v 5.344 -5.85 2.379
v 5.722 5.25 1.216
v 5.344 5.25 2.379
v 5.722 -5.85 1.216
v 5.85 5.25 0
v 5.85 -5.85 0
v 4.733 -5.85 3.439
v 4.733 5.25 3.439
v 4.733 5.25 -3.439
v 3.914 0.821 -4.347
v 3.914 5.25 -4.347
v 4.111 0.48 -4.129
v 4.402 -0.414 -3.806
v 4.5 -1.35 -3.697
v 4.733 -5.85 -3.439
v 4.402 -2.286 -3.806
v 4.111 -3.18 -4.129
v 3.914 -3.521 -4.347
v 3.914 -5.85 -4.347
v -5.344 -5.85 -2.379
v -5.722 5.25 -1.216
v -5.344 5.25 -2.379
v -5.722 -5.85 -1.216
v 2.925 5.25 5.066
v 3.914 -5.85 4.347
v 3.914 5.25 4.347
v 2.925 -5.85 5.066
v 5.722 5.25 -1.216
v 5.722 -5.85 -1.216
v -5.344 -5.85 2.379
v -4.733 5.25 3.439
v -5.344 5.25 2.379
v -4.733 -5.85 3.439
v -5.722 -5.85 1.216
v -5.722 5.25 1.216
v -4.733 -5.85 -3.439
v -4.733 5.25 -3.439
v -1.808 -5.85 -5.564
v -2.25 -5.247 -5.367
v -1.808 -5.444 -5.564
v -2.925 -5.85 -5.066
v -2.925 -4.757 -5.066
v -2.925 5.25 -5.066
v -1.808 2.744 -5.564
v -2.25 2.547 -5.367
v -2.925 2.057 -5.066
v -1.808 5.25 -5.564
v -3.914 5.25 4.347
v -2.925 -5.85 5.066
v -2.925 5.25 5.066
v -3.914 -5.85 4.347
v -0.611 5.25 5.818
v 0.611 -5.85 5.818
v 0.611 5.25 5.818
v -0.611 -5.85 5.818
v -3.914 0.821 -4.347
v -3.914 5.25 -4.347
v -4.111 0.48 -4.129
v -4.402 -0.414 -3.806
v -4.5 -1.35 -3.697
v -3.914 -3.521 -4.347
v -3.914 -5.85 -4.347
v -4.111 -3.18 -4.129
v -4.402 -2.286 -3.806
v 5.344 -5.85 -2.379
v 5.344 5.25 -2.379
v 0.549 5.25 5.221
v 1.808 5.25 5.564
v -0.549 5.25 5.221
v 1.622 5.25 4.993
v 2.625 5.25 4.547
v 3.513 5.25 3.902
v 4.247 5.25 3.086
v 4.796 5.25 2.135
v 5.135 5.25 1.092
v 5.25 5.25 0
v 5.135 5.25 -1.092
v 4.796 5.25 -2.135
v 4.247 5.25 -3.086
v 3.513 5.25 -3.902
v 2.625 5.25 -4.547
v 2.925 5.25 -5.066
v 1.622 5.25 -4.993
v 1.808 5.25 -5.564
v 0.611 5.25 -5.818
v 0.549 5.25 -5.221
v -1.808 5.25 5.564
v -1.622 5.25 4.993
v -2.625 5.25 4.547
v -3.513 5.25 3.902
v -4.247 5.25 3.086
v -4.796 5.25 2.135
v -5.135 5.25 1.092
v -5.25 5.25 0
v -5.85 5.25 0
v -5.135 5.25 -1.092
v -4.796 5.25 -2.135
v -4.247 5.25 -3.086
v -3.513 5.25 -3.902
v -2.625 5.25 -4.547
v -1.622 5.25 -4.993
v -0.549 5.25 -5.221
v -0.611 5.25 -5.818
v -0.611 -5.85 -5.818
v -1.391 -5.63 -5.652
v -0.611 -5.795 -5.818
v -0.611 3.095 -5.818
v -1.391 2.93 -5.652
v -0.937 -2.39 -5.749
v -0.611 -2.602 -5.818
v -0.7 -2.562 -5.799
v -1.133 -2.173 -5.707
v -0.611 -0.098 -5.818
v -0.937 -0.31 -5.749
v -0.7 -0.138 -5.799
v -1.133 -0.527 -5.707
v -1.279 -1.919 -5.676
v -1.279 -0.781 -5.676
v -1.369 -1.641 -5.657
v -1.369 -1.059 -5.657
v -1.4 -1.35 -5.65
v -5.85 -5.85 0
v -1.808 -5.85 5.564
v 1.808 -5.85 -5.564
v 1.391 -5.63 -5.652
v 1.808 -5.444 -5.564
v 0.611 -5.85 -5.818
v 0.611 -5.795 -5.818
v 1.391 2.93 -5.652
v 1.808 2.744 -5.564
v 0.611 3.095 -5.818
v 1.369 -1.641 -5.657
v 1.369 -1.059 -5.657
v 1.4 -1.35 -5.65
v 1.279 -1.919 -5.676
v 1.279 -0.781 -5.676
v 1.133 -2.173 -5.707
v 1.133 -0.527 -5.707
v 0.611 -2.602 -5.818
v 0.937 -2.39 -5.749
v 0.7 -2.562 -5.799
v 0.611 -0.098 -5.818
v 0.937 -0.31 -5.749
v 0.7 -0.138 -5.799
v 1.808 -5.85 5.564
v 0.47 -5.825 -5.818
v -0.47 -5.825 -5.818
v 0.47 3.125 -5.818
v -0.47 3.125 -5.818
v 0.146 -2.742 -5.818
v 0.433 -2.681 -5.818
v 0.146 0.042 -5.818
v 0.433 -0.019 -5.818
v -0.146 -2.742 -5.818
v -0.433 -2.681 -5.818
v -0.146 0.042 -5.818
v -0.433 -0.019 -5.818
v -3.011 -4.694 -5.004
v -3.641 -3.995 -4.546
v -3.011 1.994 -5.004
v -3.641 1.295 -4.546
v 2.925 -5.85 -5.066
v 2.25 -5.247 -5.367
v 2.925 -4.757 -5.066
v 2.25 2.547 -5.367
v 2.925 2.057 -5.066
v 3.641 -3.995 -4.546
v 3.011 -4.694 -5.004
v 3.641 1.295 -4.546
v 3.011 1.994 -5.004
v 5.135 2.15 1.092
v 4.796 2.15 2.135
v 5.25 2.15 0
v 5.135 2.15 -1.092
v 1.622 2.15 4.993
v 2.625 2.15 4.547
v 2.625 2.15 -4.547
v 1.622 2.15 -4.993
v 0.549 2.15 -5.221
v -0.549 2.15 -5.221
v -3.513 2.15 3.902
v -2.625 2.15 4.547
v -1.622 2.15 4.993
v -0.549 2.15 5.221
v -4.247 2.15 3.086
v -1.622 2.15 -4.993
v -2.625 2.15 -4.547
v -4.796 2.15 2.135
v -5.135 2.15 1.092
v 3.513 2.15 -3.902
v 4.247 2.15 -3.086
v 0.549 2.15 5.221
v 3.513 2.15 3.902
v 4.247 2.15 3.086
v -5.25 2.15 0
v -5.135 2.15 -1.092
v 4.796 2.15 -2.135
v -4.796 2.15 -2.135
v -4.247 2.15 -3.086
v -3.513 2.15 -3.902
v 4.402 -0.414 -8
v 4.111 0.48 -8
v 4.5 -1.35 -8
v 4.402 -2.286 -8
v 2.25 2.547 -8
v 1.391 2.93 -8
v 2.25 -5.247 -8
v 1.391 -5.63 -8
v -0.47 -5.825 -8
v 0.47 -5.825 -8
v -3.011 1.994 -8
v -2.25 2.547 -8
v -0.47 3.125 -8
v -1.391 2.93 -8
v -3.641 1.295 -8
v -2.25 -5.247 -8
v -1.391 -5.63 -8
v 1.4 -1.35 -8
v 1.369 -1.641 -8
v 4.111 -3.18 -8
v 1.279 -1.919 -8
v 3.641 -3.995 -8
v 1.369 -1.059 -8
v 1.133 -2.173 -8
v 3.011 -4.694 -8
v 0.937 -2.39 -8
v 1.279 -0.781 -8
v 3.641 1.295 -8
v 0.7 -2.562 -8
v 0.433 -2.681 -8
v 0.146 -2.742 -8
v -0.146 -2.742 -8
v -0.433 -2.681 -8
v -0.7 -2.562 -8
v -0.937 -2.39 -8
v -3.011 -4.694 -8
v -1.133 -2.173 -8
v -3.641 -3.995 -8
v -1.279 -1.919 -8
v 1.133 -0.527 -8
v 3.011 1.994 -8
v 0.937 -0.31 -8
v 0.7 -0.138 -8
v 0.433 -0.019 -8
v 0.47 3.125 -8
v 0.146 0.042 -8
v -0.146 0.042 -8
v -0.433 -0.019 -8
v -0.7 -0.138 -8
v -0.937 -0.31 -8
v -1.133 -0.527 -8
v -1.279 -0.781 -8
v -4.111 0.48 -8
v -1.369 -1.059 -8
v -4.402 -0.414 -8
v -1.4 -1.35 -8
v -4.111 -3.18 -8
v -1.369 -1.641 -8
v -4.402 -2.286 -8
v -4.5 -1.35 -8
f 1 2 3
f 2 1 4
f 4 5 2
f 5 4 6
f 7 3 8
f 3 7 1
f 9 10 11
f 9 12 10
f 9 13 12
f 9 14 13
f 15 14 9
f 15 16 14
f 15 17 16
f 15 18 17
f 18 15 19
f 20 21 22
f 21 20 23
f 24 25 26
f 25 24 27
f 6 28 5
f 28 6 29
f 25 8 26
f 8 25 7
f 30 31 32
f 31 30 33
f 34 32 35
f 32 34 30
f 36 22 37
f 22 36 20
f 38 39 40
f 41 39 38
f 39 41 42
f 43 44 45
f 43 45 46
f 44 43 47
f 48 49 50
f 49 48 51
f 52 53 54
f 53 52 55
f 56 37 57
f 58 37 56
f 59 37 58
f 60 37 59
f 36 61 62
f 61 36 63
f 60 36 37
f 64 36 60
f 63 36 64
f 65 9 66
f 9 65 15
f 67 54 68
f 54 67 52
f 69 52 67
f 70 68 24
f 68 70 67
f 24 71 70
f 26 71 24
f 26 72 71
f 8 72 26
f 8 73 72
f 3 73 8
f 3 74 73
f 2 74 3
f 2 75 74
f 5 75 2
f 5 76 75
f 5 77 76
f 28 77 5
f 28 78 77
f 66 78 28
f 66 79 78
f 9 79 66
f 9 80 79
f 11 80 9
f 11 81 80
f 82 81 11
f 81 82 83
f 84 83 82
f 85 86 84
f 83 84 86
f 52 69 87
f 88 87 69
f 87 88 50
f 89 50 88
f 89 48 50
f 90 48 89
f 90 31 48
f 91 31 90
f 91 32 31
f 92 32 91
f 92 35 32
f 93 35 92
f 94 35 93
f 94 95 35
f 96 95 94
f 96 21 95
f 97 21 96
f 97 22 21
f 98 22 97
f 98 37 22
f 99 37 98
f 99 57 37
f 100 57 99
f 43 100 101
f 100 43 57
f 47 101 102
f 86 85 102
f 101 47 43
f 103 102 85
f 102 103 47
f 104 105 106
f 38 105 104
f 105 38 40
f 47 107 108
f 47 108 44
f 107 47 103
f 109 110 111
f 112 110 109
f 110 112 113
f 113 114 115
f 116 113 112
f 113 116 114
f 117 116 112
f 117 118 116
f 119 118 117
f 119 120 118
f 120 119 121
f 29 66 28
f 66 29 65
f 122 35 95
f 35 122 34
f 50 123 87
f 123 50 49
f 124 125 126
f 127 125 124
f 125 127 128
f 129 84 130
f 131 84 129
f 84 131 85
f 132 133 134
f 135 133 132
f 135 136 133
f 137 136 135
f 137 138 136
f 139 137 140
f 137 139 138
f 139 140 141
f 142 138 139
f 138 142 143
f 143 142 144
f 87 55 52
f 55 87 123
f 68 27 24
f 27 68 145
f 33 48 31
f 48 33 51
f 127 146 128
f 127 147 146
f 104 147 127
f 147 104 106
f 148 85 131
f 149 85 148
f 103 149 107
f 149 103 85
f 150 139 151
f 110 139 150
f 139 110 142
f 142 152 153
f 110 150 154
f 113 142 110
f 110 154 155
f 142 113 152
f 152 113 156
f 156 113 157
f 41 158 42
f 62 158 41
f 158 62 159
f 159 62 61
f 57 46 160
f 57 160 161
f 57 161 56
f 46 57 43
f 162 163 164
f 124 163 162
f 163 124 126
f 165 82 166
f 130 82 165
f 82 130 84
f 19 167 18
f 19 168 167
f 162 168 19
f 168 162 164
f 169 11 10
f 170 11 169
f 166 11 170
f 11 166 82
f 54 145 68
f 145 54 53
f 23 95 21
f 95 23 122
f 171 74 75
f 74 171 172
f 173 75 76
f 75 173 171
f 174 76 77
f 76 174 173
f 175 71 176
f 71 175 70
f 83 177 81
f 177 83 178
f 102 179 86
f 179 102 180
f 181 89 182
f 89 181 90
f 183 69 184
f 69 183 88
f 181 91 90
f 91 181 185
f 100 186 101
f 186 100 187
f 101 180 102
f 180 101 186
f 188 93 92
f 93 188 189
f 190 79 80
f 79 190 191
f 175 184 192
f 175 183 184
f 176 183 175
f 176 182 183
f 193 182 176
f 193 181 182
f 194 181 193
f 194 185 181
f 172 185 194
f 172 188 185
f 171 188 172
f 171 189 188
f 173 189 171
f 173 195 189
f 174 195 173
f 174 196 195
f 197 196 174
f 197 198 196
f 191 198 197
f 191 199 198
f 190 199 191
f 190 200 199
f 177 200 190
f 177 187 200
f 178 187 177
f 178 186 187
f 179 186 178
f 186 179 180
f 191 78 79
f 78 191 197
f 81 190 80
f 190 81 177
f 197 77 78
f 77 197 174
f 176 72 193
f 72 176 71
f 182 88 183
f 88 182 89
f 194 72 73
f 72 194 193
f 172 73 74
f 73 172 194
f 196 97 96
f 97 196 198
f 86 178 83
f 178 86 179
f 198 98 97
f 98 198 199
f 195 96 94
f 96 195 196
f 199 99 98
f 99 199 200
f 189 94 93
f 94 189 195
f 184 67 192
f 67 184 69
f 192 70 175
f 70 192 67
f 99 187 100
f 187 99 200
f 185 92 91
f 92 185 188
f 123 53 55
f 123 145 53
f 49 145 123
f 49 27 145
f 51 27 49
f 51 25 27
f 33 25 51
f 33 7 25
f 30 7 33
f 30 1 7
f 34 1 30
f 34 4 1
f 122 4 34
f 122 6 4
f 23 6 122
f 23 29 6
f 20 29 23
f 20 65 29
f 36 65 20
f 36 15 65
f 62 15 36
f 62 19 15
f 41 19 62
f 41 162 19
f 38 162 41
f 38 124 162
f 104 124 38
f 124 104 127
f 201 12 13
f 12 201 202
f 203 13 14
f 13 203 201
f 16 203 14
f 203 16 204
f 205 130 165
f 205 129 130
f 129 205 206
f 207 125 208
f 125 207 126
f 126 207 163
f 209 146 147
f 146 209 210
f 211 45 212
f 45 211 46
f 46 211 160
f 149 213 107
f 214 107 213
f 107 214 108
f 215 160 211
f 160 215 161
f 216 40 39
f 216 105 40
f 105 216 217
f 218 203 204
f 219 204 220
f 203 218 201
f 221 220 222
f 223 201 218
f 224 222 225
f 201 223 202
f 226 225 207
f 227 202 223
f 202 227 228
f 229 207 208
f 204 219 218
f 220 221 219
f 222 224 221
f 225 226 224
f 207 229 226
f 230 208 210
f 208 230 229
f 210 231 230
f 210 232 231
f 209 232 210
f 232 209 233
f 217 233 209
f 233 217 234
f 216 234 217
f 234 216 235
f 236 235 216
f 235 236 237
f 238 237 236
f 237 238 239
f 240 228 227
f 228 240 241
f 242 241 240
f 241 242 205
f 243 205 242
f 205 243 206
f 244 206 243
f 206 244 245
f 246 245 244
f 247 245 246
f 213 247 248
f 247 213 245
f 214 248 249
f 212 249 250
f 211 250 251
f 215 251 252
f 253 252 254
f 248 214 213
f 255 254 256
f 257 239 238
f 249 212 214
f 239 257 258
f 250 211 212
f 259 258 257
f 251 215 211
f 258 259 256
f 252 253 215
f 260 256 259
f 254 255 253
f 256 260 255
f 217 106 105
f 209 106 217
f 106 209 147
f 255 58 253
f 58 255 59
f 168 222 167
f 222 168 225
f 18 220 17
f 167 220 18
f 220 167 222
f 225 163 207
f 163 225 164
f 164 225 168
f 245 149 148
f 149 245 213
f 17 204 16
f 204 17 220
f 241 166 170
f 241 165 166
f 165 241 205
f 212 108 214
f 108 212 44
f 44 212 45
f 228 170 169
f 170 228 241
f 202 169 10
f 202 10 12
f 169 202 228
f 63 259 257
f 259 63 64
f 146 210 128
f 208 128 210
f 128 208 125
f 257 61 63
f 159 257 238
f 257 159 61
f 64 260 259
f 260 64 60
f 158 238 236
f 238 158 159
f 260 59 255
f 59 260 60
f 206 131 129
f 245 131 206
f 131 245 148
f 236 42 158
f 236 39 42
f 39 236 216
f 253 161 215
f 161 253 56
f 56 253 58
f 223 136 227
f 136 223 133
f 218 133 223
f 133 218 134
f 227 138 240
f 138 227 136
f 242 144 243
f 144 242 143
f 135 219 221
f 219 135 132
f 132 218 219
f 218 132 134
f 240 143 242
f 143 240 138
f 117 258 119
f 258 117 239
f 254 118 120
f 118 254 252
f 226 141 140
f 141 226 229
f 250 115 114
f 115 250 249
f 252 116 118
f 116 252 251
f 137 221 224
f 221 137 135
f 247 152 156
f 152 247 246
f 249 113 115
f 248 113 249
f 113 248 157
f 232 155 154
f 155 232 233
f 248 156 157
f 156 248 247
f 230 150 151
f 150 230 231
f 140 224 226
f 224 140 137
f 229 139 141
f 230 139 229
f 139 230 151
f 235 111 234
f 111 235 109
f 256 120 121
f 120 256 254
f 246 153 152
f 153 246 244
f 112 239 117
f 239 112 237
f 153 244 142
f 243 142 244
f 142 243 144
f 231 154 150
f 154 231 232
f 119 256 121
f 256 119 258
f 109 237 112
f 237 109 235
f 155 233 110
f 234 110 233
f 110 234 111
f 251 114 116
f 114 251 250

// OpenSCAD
SCREW_DIA = 2.8;
STANDOFF_DIA = 9;
STANDOFF_HEIGHT = 8;
SCREW_LENGTH = STANDOFF_HEIGHT - 3;

MAGNET_DIA = 10.5;
MAGNET_HEIGHT = 3.1;
HOLDER_DIA = MAGNET_DIA+1.2;
HOLDER_HEIGHT = 5.25;

ANGLE = 90;
ROUNDED = false;

$fn = 30;

module tube(outer_dia, inner_dia, outer_height, inner_height) {
    difference() {
        cylinder(d = outer_dia, h = outer_height);
        cylinder(d = inner_dia, h = inner_height);
    }
}

module standoff() {
    tube(STANDOFF_DIA, SCREW_DIA, STANDOFF_HEIGHT, SCREW_LENGTH);
}

module magnet_mount() {
    union() {
        intersection() {
            if(ROUNDED) sphere(d = HOLDER_DIA);
            cylinder(d = HOLDER_DIA, h = HOLDER_DIA/2);
        }
        translate([0, 0, -HOLDER_HEIGHT])
            tube(HOLDER_DIA, MAGNET_DIA, HOLDER_HEIGHT, MAGNET_HEIGHT);
    }
}

module mount_joint() {
    rotate([ANGLE, 0, 0])
        magnet_mount();
}

union() {
    mount_joint();
    difference() {
        translate([0, -HOLDER_DIA/2+STANDOFF_DIA/2, -STANDOFF_HEIGHT])
            standoff();
        hull()
            mount_joint();
    }
}
